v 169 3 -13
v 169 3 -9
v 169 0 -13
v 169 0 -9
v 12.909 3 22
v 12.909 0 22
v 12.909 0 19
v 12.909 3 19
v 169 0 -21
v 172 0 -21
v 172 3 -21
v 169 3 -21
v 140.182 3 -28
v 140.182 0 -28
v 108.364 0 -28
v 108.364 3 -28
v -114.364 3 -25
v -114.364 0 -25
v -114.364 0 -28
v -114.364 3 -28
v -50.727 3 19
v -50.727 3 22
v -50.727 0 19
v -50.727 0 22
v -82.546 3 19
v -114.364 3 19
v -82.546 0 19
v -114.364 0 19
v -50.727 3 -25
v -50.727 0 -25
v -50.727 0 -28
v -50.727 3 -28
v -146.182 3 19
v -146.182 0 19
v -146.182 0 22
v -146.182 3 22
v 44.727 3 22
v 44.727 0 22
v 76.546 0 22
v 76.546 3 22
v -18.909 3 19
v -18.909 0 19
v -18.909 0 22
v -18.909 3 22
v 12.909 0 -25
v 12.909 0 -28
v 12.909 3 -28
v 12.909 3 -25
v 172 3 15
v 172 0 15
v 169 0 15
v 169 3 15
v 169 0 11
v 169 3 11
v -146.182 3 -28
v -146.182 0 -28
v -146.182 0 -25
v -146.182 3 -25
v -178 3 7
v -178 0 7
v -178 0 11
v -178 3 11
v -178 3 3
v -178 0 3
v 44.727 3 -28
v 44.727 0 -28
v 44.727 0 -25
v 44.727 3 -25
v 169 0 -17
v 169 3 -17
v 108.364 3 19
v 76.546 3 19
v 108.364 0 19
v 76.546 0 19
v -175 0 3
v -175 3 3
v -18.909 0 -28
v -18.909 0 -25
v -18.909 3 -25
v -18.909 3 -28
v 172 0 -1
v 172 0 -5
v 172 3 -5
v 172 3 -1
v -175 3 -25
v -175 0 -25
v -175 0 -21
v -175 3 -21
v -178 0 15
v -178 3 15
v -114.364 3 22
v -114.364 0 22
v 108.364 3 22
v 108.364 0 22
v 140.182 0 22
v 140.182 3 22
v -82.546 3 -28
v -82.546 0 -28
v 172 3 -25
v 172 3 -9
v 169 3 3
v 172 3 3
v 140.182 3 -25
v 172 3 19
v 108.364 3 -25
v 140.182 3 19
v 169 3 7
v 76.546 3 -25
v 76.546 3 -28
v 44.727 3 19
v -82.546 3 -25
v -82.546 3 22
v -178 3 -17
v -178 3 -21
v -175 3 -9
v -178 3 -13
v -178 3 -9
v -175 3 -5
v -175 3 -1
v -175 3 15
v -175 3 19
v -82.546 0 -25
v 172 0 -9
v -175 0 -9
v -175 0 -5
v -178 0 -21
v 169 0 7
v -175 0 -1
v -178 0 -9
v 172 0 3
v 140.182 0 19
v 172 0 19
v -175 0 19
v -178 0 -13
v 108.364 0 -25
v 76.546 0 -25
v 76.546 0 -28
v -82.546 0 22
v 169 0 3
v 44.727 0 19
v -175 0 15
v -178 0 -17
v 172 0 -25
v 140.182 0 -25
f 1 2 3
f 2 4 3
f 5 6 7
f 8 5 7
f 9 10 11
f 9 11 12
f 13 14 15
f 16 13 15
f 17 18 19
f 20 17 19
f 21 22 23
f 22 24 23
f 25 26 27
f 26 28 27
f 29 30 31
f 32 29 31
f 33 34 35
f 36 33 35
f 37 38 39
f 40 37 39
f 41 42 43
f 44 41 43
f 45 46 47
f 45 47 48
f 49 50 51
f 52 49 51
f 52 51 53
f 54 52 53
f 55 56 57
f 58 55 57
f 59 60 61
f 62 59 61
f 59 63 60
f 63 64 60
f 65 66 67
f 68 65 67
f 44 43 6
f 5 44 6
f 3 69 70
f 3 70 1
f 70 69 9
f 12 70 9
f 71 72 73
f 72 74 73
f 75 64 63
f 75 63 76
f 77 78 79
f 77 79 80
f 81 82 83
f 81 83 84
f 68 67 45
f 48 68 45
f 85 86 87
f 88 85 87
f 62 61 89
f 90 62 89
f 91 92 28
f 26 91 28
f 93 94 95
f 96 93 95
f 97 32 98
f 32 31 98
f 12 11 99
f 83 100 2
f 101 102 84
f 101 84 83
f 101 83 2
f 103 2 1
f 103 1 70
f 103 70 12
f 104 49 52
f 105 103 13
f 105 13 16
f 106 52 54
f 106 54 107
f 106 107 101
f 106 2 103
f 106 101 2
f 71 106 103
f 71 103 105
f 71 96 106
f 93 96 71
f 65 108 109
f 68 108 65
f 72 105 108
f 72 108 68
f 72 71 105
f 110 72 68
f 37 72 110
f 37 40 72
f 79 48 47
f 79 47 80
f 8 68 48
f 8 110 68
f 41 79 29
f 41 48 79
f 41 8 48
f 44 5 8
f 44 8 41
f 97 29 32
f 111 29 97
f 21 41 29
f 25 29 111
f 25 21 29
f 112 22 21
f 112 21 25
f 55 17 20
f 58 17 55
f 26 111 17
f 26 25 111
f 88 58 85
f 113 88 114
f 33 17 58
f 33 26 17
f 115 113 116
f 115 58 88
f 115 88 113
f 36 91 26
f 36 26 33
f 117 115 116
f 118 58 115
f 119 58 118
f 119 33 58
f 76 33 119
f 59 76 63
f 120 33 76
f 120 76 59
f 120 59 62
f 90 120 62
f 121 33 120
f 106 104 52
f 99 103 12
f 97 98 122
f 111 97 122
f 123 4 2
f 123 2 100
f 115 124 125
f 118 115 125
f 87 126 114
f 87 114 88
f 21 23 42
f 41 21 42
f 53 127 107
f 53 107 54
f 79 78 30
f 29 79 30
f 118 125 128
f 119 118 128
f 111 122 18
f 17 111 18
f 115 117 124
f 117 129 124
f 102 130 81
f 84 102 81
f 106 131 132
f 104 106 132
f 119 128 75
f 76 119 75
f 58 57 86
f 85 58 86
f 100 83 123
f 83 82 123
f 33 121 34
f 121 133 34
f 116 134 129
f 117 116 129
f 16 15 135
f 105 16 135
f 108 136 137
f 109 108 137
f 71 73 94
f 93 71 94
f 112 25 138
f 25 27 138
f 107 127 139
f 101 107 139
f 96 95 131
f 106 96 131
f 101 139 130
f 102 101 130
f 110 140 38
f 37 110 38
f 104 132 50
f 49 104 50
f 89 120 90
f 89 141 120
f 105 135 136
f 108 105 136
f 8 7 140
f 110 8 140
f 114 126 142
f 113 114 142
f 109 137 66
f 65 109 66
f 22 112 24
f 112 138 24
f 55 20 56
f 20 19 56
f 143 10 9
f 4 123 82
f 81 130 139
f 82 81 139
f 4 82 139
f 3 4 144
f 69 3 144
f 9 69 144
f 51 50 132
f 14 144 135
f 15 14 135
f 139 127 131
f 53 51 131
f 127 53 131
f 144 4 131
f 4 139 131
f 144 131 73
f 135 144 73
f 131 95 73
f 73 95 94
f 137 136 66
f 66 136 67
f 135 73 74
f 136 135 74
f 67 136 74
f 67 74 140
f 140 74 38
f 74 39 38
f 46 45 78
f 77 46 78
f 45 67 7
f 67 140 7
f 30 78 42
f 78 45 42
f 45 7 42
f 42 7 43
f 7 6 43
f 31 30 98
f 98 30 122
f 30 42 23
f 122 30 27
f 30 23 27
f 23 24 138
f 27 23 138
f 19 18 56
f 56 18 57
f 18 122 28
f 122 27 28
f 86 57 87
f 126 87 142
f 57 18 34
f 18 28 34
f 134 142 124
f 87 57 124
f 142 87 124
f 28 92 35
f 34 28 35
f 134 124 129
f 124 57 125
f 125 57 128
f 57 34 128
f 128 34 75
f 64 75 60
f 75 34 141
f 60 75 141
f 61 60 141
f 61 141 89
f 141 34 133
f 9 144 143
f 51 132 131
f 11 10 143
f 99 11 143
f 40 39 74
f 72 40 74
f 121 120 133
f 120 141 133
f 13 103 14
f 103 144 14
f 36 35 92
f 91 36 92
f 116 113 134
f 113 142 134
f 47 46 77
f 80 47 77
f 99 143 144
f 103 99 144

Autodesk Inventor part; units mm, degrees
ref_plane "YZ Plane" through (0, 0, 0) normal (1, 0, 0) x (0, 1, 0)
ref_plane "XZ Plane" through (0, 0, 0) normal (0, 1, 0) x (-1, 0, 0)
ref_plane "XY Plane" through (0, 0, 0) normal (0, 0, 1) x (1, 0, 0)
sketch "Sketch1" plane through (0, 0, 0) normal (0, 1, 0) x (-1, 0, 0)
  line L0 (146.1818, 19) -> (146.1818, 22)
  line L1 (114.3636, 22) -> (114.3636, 19)
  line L2 (82.5455, 19) -> (82.5455, 22)
  line L3 (50.7273, 22) -> (50.7273, 19)
  line L4 (18.9091, 19) -> (18.9091, 22)
  line L5 (-12.9091, 22) -> (-12.9091, 19)
  line L6 (-44.7273, 19) -> (-44.7273, 22)
  line L7 (-76.5455, 22) -> (-76.5455, 19)
  line L8 (-108.3636, 19) -> (-108.3636, 22)
  line L9 (-140.1818, 22) -> (-140.1818, 19)
  line L10 (-172, 15) -> (-169, 15)
  line L11 (-169, 3) -> (-172, 3)
  line L12 (-169, -9) -> (-172, -9)
  line L13 (-172, -21) -> (-169, -21)
  line L14 (-140.1818, -25) -> (-140.1818, -28)
  line L15 (-108.3636, -28) -> (-108.3636, -25)
  line L16 (-76.5455, -25) -> (-76.5455, -28)
  line L17 (-44.7273, -28) -> (-44.7273, -25)
  line L18 (-12.9091, -28) -> (-12.9091, -25)
  line L19 (18.9091, -25) -> (18.9091, -28)
  line L20 (146.1818, -28) -> (146.1818, -25)
  line L21 (114.3636, -25) -> (114.3636, -28)
  line L22 (82.5455, -28) -> (82.5455, -25)
  line L23 (50.7273, -25) -> (50.7273, -28)
  line L24 (178, -21) -> (175, -21)
  line L25 (175, 15) -> (178, 15)
  line L26 (178, 3) -> (175, 3)
  line L27 (114.3636, -28) -> (146.1818, -28)
  line L28 (50.7273, -28) -> (82.5455, -28)
  line L29 (-12.9091, -28) -> (18.9091, -28)
  line L30 (178, -21) -> (178, -17)
  line L31 (178, 3) -> (178, 7)
  line L32 (178, 11) -> (178, 15)
  line L33 (146.1818, 22) -> (114.3636, 22)
  line L34 (82.5455, 22) -> (50.7273, 22)
  line L35 (18.9091, 22) -> (-12.9091, 22)
  line L36 (-44.7273, 22) -> (-76.5455, 22)
  line L37 (-108.3636, 22) -> (-140.1818, 22)
  line L38 (-169, 15) -> (-169, 11)
  line L39 (-169, 7) -> (-169, 3)
  line L40 (-172, 3) -> (-172, -1)
  line L41 (-172, 19) -> (-172, 15)
  line L42 (-140.1818, -28) -> (-108.3636, -28)
  line L43 (-76.5455, -28) -> (-44.7273, -28)
  line L44 (-169, -9) -> (-169, -13)
  line L45 (-169, -17) -> (-169, -21)
  line L46 (-172, -5) -> (-172, -9)
  line L47 (-172, -21) -> (-172, -25)
  line L48 (-172, -25) -> (-140.1818, -25)
  line L49 (-108.3636, -25) -> (-76.5455, -25)
  line L50 (-44.7273, -25) -> (-12.9091, -25)
  line L51 (18.9091, -25) -> (50.7273, -25)
  line L52 (82.5455, -25) -> (114.3636, -25)
  line L53 (146.1818, -25) -> (175, -25)
  line L54 (175, -25) -> (175, -21)
  line L55 (175, -1) -> (175, 3)
  line L56 (175, 15) -> (175, 19)
  line L57 (175, 19) -> (146.1818, 19)
  line L58 (114.3636, 19) -> (82.5455, 19)
  line L59 (50.7273, 19) -> (18.9091, 19)
  line L60 (-12.9091, 19) -> (-44.7273, 19)
  line L61 (-76.5455, 19) -> (-108.3636, 19)
  line L62 (-140.1818, 19) -> (-172, 19)
  line L63 (178, -13) -> (178, -9)
  line L64 (178, -9) -> (175, -9)
  line L65 (175, -9) -> (175, -5)
  line L66 (-169, -17) -> (-169, -13)
  line L67 (-172, -5) -> (-172, -1)
  line L68 (-169, 7) -> (-169, 11)
  line L69 (178, -17) -> (178, -13)
  line L70 (175, -5) -> (175, -1)
  line L71 (178, 7) -> (178, 11)
  point P0 (0, 0)
  point P1 (-219, 16.6364)
  point P2 (-222, -22.6364)
  point P3 (228, -22.6364)
  dimension "d1" = 347
  dimension "d3" = 44
  dimension "d5" = 25
  dimension "d6" = 175
  dimension "d9" = 3
  dimension "d15" = 3
  dimension "d16" = 3
  dimension "d17" = 3
  dimension "d18" = 12
  dimension "d19" = 12
  dimension "d20" = 12
  dimension "d21" = 4
  dimension "d23" = 31.8182
extrude "Extrusion1" add sketch "Sketch1" along normal blind 3
equation "\"d1\" = wt - tt"
equation "\"d3\" = -2 * tt + ht"
equation "\"d5\" = 0.5 * ht"
equation "\"d6\" = 0.5 * wt"
equation "\"d9\" = tt"
equation "\"d15\" = tt"
equation "\"d16\" = tt"
equation "\"d17\" = tt"
equation "\"d18\" = 0.272727 * ht - 0.545455 * tt"
equation "\"d19\" = d18"
equation "\"d20\" = d18"
equation "\"d21\" = -0.181818 * tt + 0.0909091 * ht"
equation "\"d23\" = 0.0909091 * wt"
equation "\"d13\" = tt"
equation "\"wt\" = 350"
equation "\"tt\" = 3"
equation "\"tol\" = 0"
equation "\"tiroir\" = 25.4"
equation "\"nHoles\" = 101.6"
equation "\"shelfH\" = 35"
equation "\"d0\" = 0.5 * wt"
equation "\"d2\" = 0.5 * lt"
equation "\"d4\" = tt"
equation "\"ht\" = 50"
equation "\"lt\" = 350"
properties part number "base"
